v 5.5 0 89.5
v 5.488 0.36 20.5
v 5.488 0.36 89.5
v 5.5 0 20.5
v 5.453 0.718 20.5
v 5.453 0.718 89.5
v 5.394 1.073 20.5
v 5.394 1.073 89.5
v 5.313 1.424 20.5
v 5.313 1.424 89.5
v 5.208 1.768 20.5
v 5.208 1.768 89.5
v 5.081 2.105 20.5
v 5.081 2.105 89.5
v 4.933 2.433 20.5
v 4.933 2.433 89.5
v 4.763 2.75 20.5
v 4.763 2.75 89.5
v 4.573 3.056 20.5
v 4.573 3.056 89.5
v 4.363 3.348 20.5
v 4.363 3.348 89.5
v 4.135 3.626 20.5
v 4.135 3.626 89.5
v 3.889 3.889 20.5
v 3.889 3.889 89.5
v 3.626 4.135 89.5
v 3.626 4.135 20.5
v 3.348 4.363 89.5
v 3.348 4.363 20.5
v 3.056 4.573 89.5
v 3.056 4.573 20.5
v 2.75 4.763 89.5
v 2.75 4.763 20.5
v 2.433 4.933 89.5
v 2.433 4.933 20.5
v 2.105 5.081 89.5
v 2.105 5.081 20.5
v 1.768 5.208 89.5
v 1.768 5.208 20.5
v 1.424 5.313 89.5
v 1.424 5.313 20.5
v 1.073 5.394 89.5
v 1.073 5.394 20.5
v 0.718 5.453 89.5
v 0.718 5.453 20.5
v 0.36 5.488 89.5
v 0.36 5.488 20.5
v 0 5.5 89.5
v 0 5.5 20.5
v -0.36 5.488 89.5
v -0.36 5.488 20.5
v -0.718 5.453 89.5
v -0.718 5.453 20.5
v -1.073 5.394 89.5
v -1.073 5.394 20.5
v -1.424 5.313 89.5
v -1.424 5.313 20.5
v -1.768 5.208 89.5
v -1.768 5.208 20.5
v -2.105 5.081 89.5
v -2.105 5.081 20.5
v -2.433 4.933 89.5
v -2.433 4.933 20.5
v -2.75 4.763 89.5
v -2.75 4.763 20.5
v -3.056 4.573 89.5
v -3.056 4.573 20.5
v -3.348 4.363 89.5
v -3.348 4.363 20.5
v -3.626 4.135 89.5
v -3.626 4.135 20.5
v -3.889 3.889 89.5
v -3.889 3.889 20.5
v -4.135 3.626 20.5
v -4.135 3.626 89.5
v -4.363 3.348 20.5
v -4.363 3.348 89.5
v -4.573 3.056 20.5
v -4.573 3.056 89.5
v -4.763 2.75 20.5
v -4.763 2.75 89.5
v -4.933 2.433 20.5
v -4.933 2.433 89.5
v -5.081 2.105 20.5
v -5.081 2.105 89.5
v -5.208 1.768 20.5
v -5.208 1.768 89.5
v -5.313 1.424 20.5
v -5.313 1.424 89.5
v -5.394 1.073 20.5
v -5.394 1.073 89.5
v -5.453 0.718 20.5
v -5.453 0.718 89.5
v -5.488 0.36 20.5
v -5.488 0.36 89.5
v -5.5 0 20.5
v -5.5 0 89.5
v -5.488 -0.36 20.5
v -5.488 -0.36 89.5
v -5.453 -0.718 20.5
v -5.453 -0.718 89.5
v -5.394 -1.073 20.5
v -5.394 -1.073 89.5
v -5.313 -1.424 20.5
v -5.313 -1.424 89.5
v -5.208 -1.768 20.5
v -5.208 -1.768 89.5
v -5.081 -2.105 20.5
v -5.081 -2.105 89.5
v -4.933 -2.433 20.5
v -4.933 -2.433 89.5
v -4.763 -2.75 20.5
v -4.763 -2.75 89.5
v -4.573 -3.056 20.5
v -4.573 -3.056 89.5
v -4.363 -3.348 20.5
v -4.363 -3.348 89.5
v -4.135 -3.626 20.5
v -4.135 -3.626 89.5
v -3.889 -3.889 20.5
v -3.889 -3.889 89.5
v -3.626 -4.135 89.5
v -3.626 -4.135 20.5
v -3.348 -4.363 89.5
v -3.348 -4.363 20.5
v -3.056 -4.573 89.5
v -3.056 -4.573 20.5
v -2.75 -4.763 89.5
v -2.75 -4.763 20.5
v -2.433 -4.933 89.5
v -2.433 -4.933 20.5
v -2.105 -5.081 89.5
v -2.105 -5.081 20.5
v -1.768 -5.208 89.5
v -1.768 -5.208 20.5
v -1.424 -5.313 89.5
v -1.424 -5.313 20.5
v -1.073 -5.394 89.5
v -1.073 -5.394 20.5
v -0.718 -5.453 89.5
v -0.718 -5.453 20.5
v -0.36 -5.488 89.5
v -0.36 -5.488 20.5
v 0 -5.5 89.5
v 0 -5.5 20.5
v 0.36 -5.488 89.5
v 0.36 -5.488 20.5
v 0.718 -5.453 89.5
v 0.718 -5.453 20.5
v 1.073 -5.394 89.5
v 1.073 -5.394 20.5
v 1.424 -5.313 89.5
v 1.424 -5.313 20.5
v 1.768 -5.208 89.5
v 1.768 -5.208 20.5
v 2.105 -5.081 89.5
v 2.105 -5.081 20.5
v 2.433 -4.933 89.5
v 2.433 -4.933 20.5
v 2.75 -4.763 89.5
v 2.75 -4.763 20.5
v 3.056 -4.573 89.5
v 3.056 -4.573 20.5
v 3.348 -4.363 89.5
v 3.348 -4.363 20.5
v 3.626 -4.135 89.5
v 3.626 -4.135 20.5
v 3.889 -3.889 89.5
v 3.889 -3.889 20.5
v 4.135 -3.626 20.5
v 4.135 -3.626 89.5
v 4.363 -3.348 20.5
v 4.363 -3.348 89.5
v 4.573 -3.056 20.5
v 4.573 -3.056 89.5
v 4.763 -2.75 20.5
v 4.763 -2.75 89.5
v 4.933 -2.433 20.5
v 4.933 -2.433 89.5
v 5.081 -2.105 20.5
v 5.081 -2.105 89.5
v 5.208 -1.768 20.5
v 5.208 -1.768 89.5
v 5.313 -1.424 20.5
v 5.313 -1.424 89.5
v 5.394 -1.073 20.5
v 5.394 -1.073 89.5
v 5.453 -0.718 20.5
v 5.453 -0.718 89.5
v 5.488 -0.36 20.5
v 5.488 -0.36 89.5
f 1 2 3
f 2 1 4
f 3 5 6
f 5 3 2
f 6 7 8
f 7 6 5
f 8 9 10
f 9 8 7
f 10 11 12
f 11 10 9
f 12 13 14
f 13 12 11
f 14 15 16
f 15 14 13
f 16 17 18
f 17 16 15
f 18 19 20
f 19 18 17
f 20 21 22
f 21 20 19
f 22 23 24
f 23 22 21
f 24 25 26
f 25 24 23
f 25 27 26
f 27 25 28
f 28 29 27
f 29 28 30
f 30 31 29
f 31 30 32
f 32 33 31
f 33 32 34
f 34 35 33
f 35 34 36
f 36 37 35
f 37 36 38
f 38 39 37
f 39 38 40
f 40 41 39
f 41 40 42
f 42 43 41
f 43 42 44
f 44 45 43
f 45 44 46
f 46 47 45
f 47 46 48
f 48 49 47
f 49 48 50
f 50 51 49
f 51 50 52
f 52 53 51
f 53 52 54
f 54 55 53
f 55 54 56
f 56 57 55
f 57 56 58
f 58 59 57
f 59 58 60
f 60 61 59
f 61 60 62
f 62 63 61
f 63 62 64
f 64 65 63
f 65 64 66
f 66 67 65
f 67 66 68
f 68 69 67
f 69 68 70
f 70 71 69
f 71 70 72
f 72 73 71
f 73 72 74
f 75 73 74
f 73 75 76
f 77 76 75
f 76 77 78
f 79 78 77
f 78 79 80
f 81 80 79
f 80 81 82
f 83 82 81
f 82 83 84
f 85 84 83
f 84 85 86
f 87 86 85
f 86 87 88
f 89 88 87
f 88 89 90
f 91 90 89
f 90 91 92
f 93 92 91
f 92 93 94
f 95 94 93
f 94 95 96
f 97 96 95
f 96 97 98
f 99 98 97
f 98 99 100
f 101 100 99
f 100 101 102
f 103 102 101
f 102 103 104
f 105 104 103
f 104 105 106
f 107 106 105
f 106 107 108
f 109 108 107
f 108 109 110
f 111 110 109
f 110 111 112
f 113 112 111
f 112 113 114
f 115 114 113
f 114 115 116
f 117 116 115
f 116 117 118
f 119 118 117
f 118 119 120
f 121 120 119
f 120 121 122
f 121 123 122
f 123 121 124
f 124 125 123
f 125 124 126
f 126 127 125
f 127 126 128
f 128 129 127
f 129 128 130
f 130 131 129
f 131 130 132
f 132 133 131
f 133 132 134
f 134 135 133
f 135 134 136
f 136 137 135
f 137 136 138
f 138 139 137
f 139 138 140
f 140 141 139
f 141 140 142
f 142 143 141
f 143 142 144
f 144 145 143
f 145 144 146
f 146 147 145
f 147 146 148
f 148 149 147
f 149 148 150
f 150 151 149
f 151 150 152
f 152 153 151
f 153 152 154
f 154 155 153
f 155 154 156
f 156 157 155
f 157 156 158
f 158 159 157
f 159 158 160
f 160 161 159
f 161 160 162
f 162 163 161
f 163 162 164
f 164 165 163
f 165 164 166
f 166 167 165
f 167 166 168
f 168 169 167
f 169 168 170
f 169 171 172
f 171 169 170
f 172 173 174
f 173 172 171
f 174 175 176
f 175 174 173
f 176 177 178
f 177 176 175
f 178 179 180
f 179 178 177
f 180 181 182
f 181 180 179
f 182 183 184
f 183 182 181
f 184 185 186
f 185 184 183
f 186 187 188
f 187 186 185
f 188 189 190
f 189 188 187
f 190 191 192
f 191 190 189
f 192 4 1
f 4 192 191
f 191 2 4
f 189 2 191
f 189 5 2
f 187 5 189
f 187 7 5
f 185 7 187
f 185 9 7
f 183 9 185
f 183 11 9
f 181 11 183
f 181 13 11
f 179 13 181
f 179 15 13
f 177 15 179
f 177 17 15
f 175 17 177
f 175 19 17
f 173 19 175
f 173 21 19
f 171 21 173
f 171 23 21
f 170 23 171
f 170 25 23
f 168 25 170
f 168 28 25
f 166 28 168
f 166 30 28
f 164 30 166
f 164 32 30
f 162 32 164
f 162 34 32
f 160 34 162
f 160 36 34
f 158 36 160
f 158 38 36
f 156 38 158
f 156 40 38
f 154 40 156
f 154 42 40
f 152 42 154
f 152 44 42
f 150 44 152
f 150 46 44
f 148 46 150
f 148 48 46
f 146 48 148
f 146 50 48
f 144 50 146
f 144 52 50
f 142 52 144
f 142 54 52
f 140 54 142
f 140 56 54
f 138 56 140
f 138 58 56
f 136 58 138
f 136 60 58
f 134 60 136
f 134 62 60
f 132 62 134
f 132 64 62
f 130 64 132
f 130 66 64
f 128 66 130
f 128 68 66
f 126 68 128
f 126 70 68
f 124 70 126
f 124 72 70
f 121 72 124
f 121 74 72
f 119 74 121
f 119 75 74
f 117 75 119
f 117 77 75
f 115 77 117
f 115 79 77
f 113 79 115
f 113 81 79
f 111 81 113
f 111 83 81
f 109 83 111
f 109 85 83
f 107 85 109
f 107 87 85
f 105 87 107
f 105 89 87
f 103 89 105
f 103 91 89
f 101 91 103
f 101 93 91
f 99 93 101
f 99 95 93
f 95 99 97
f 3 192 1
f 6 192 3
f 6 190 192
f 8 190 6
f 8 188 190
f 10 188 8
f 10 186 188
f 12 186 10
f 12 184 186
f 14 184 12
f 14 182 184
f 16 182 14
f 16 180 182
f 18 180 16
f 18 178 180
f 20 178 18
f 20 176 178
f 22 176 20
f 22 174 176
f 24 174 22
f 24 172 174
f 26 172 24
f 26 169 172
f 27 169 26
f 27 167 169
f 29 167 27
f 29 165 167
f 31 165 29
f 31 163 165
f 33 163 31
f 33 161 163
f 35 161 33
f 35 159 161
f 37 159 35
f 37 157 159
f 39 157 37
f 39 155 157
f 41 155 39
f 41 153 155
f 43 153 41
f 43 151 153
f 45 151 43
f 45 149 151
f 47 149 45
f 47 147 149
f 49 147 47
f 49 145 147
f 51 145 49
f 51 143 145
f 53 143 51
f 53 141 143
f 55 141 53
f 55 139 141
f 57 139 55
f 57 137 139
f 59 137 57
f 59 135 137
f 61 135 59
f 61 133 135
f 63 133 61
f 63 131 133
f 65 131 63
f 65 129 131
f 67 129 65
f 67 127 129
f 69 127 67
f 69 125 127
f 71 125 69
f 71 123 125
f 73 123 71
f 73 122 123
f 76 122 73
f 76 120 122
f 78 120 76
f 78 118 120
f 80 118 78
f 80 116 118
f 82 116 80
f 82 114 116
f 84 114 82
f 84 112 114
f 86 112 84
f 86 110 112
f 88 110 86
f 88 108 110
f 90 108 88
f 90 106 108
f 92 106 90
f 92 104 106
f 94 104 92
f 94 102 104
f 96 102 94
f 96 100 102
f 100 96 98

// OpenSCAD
translate([0, 0, 20.5]) {
  cylinder(h = 69, r = 5.5);
}
$fn = 96;
